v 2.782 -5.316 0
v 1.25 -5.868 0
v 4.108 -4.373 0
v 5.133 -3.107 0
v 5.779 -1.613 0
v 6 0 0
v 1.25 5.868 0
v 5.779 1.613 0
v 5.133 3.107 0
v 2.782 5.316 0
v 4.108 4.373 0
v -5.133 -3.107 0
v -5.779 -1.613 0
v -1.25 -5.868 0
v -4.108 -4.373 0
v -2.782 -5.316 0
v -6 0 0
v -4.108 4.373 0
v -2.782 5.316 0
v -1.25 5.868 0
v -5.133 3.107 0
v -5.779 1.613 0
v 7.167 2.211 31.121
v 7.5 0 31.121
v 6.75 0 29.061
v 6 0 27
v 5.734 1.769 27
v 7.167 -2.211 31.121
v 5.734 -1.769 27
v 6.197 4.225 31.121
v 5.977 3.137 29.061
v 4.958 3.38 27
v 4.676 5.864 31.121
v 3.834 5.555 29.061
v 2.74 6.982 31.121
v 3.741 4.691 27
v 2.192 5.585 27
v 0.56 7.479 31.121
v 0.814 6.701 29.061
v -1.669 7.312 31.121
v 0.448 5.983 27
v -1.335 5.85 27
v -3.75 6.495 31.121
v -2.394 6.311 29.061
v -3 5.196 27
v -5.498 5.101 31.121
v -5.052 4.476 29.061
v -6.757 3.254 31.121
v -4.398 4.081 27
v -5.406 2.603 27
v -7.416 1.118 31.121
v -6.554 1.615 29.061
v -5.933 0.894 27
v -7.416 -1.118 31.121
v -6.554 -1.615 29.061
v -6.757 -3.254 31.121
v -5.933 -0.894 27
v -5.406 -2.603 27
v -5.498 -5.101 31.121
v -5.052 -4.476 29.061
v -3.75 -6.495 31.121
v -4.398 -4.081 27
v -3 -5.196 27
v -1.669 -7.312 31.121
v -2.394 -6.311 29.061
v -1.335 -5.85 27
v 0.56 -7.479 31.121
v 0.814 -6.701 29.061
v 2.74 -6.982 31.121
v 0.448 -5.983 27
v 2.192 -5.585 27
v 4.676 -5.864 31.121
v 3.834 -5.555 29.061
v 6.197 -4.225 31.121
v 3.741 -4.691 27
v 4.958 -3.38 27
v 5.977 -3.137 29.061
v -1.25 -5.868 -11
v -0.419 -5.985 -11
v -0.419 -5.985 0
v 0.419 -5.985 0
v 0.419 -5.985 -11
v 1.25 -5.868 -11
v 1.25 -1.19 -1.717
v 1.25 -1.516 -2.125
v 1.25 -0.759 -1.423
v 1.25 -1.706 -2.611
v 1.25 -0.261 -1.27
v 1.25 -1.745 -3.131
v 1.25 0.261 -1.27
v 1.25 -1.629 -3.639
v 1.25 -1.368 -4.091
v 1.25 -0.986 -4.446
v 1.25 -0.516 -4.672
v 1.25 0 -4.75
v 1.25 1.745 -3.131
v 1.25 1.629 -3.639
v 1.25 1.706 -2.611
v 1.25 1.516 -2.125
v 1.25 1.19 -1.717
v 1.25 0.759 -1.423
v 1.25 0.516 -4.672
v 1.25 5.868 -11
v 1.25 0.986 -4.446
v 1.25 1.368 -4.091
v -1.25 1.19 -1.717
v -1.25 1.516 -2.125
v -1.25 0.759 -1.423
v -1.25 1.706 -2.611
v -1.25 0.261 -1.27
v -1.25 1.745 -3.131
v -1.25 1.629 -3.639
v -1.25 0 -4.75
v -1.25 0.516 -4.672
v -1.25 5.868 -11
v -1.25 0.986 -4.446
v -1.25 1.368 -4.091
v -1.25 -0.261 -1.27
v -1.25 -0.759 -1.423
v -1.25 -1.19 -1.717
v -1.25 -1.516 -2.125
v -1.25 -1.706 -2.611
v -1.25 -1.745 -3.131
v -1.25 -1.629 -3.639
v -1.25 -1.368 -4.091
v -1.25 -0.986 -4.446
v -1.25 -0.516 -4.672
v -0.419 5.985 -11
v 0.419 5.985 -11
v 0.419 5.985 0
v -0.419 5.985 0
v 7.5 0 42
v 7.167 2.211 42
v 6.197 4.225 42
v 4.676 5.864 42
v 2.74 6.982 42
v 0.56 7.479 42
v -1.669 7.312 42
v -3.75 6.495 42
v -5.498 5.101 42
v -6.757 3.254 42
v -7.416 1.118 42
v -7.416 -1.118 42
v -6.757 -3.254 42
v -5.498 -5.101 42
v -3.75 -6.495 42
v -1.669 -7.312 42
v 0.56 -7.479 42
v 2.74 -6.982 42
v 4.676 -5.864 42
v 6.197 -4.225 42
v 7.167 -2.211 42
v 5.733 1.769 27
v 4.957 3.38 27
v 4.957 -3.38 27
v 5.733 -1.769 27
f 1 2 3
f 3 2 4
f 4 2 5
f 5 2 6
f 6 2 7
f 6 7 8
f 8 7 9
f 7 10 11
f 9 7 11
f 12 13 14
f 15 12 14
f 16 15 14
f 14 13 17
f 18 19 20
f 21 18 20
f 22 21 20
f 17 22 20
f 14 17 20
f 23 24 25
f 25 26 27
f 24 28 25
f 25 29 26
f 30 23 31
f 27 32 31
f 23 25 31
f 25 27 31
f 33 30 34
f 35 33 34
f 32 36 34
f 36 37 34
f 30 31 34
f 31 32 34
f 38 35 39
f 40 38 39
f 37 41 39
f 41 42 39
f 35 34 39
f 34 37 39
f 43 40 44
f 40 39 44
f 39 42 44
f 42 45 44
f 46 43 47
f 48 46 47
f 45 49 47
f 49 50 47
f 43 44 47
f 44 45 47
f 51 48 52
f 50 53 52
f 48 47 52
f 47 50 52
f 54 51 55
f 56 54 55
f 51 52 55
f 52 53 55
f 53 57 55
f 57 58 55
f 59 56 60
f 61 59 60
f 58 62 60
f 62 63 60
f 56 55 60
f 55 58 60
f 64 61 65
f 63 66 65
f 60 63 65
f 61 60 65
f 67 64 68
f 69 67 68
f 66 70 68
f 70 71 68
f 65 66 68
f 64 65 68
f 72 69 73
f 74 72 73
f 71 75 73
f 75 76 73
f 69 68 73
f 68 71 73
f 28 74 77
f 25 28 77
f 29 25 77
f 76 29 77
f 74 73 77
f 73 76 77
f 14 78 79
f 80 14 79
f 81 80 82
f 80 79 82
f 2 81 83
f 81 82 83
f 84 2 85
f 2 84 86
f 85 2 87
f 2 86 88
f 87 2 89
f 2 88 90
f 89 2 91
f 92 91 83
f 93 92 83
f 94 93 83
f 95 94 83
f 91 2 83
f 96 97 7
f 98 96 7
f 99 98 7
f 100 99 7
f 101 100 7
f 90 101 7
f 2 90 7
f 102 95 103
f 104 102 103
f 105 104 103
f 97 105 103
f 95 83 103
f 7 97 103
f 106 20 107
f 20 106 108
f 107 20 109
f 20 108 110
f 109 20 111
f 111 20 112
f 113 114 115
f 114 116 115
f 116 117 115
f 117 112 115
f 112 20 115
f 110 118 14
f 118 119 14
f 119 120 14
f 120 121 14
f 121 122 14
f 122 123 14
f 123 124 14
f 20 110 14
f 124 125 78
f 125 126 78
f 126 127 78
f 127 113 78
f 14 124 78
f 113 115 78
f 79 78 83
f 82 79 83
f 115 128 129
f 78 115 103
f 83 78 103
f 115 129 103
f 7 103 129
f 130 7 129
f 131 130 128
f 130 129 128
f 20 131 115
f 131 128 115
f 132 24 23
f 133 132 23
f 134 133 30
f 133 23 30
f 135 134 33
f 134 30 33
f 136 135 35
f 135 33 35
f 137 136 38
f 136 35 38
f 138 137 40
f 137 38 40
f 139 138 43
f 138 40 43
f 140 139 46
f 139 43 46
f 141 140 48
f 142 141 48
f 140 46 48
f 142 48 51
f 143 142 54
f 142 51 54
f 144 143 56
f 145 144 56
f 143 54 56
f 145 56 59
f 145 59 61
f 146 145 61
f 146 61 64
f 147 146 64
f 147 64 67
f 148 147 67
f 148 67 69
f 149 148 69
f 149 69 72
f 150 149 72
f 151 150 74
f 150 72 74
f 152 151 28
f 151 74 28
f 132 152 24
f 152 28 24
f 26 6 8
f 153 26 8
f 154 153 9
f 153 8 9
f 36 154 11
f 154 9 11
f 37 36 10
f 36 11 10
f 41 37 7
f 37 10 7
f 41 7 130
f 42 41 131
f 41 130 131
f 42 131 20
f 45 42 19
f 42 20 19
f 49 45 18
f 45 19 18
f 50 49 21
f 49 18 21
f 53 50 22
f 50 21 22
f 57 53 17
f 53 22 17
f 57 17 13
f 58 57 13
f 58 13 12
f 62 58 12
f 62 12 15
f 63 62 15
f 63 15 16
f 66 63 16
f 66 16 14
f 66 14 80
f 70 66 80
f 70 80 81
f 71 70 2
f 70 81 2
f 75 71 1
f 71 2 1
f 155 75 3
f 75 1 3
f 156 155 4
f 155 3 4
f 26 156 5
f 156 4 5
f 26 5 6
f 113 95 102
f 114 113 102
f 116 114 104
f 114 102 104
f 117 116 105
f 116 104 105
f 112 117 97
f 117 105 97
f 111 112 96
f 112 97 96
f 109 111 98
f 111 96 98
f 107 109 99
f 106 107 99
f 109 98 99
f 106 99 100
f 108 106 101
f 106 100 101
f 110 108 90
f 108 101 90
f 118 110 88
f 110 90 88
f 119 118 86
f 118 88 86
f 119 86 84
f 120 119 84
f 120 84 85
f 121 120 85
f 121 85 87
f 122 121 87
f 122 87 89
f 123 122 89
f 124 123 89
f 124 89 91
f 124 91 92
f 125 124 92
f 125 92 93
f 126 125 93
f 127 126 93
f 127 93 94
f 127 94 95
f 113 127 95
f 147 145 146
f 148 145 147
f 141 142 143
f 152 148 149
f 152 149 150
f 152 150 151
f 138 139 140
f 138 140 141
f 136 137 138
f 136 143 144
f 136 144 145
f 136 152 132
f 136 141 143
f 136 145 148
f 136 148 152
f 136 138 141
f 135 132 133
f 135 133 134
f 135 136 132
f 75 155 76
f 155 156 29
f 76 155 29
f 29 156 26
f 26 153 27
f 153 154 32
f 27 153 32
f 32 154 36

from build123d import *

# Parameters (mm, degrees)
SKETCH1_R           = 6
BOSS_EXTRUDE1_DEPTH = 27
BOSS_EXTRUDE2_START = 11
BOSS_EXTRUDE2_DEPTH = 11
SKETCH3_R           = 1.75
CUT_EXTRUDE1_DEPTH  = 6
SKETCH4_R           = 7.5
BOSS_EXTRUDE3_DEPTH = 15
CHAMFER1_SIZE2      = 1.5
CHAMFER1_SIZE       = 4.121216129


with BuildPart() as part:
    # Sketch1 → Boss-Extrude1 (new body)
    with BuildSketch(Plane.XY):
        Circle(SKETCH1_R)
    extrude(amount=BOSS_EXTRUDE1_DEPTH)

    # Sketch2 → Boss-Extrude2 (add)
    with BuildSketch(Plane(origin=(0, 0, 0), x_dir=(-1, 0, 0), z_dir=(0, 0, -1)).offset(BOSS_EXTRUDE2_START)):
        with BuildLine():
            Line((-1.25, -5.868347297), (-1.25, 5.868347297))
            ThreePointArc((-1.25, 5.868347297), (0, 6), (1.25, 5.868347297))
            Line((1.25, 5.868347297), (1.25, -5.868347297))
            ThreePointArc((1.25, -5.868347297), (0, -6), (-1.25, -5.868347297))
        make_face()
    extrude(amount=-BOSS_EXTRUDE2_DEPTH)

    # Sketch3 → Cut-Extrude1 (cut)
    with BuildSketch(Plane(origin=(1.25, 0, 0), x_dir=(0, 0, -1), z_dir=(1, 0, 0))):
        with Locations((3, 0)):
            Circle(SKETCH3_R)
    extrude(amount=-CUT_EXTRUDE1_DEPTH, mode=Mode.SUBTRACT)

    # Sketch4 → Boss-Extrude3 (add)
    with BuildSketch(Plane.XY.offset(27)):
        Circle(SKETCH4_R)
    extrude(amount=BOSS_EXTRUDE3_DEPTH)

    # Chamfer1
    chamfer1_edges = [part.edges().sort_by_distance(p)[0] for p in [
        (-7.5, 0, 27),
    ]]
    chamfer1_side = [part.faces().sort_by_distance(p)[0] for p in [
        (-7.5, 0, 27.03),
    ]]
    chamfer(chamfer1_edges, length=CHAMFER1_SIZE - 0.0001, length2=CHAMFER1_SIZE2 - 0.0001, reference=chamfer1_side[0])  # a hair under: the kernel refuses the full size


solid = part.part
